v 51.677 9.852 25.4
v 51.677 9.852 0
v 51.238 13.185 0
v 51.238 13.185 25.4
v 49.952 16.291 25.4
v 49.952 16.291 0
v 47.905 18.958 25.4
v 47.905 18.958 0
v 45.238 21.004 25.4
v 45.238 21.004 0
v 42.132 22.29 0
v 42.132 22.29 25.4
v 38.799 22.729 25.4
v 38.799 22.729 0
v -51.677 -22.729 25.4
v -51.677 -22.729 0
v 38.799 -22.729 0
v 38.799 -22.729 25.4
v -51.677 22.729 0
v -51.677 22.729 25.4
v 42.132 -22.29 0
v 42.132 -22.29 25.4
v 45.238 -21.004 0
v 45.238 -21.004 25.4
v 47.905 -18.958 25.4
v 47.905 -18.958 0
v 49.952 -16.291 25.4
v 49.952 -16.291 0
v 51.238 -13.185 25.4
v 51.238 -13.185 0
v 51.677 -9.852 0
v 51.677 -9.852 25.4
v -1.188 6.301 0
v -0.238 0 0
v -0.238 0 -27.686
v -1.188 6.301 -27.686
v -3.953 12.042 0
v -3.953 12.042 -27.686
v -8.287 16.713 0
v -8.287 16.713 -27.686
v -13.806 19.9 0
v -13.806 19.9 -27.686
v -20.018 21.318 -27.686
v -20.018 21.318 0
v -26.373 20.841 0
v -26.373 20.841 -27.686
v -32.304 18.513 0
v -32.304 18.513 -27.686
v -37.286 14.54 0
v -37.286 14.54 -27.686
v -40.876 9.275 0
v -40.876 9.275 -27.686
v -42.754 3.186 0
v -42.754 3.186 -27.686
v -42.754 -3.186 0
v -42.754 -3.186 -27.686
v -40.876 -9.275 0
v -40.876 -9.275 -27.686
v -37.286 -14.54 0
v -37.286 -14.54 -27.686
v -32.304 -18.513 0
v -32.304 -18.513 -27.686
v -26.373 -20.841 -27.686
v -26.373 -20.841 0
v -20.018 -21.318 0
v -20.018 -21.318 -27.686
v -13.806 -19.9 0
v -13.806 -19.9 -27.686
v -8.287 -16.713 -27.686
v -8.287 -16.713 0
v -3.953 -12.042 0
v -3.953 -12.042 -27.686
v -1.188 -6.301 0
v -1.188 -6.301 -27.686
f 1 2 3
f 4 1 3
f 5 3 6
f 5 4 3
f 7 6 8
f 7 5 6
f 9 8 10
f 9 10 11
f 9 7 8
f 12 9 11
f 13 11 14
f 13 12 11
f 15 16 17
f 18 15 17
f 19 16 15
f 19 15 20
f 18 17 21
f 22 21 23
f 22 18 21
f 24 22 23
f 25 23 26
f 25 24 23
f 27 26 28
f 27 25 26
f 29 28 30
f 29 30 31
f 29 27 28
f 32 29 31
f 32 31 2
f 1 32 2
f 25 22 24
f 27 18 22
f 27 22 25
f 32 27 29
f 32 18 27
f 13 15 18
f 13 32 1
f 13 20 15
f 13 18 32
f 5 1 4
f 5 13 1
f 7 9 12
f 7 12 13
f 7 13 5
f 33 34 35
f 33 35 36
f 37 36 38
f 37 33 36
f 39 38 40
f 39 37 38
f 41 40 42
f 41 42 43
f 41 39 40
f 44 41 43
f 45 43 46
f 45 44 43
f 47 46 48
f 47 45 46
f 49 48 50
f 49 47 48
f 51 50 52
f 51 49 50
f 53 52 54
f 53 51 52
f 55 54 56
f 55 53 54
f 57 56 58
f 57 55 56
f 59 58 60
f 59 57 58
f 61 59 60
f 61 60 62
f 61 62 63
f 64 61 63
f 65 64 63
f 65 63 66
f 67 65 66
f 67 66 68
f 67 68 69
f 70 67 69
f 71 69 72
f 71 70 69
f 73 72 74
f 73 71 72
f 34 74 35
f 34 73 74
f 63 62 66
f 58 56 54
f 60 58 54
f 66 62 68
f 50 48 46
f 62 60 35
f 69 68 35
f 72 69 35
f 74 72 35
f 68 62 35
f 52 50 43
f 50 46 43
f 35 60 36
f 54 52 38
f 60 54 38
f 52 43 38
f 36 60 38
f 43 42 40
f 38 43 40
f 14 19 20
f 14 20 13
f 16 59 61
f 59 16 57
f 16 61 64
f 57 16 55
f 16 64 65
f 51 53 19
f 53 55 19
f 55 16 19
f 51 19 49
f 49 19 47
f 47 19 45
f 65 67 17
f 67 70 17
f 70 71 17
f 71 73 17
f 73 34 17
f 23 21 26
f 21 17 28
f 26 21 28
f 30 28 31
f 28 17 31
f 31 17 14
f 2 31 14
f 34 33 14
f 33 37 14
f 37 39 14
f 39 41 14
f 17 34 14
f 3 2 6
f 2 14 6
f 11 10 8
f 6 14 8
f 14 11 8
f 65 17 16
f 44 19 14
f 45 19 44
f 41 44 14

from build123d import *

# Parameters (mm, degrees)
F0_W     = 103.353604
F0_H     = 45.458422
F1_DEPTH = 25.4
F2_R     = 12.877415
F3_R     = 21.377303
F4_DEPTH = 27.686


with BuildPart() as f1:
    # F0 (on Top) → F1 (new body)
    with BuildSketch(Plane.XY):
        Rectangle(F0_W, F0_H)
    extrude(amount=F1_DEPTH)

    # F2
    f2_edges = [f1.edges().sort_by_distance(p)[0] for p in [
        (51.676802, 22.729211, 12.7),
        (51.676802, -22.729211, 12.7),
    ]]
    fillet(f2_edges, radius=F2_R)

    # F3 (on Top) → F4 (join)
    with BuildSketch(Plane.XY):
        with Locations((-21.615615, 0)):
            Circle(F3_R)
    extrude(amount=-F4_DEPTH)


solid = f1.part
